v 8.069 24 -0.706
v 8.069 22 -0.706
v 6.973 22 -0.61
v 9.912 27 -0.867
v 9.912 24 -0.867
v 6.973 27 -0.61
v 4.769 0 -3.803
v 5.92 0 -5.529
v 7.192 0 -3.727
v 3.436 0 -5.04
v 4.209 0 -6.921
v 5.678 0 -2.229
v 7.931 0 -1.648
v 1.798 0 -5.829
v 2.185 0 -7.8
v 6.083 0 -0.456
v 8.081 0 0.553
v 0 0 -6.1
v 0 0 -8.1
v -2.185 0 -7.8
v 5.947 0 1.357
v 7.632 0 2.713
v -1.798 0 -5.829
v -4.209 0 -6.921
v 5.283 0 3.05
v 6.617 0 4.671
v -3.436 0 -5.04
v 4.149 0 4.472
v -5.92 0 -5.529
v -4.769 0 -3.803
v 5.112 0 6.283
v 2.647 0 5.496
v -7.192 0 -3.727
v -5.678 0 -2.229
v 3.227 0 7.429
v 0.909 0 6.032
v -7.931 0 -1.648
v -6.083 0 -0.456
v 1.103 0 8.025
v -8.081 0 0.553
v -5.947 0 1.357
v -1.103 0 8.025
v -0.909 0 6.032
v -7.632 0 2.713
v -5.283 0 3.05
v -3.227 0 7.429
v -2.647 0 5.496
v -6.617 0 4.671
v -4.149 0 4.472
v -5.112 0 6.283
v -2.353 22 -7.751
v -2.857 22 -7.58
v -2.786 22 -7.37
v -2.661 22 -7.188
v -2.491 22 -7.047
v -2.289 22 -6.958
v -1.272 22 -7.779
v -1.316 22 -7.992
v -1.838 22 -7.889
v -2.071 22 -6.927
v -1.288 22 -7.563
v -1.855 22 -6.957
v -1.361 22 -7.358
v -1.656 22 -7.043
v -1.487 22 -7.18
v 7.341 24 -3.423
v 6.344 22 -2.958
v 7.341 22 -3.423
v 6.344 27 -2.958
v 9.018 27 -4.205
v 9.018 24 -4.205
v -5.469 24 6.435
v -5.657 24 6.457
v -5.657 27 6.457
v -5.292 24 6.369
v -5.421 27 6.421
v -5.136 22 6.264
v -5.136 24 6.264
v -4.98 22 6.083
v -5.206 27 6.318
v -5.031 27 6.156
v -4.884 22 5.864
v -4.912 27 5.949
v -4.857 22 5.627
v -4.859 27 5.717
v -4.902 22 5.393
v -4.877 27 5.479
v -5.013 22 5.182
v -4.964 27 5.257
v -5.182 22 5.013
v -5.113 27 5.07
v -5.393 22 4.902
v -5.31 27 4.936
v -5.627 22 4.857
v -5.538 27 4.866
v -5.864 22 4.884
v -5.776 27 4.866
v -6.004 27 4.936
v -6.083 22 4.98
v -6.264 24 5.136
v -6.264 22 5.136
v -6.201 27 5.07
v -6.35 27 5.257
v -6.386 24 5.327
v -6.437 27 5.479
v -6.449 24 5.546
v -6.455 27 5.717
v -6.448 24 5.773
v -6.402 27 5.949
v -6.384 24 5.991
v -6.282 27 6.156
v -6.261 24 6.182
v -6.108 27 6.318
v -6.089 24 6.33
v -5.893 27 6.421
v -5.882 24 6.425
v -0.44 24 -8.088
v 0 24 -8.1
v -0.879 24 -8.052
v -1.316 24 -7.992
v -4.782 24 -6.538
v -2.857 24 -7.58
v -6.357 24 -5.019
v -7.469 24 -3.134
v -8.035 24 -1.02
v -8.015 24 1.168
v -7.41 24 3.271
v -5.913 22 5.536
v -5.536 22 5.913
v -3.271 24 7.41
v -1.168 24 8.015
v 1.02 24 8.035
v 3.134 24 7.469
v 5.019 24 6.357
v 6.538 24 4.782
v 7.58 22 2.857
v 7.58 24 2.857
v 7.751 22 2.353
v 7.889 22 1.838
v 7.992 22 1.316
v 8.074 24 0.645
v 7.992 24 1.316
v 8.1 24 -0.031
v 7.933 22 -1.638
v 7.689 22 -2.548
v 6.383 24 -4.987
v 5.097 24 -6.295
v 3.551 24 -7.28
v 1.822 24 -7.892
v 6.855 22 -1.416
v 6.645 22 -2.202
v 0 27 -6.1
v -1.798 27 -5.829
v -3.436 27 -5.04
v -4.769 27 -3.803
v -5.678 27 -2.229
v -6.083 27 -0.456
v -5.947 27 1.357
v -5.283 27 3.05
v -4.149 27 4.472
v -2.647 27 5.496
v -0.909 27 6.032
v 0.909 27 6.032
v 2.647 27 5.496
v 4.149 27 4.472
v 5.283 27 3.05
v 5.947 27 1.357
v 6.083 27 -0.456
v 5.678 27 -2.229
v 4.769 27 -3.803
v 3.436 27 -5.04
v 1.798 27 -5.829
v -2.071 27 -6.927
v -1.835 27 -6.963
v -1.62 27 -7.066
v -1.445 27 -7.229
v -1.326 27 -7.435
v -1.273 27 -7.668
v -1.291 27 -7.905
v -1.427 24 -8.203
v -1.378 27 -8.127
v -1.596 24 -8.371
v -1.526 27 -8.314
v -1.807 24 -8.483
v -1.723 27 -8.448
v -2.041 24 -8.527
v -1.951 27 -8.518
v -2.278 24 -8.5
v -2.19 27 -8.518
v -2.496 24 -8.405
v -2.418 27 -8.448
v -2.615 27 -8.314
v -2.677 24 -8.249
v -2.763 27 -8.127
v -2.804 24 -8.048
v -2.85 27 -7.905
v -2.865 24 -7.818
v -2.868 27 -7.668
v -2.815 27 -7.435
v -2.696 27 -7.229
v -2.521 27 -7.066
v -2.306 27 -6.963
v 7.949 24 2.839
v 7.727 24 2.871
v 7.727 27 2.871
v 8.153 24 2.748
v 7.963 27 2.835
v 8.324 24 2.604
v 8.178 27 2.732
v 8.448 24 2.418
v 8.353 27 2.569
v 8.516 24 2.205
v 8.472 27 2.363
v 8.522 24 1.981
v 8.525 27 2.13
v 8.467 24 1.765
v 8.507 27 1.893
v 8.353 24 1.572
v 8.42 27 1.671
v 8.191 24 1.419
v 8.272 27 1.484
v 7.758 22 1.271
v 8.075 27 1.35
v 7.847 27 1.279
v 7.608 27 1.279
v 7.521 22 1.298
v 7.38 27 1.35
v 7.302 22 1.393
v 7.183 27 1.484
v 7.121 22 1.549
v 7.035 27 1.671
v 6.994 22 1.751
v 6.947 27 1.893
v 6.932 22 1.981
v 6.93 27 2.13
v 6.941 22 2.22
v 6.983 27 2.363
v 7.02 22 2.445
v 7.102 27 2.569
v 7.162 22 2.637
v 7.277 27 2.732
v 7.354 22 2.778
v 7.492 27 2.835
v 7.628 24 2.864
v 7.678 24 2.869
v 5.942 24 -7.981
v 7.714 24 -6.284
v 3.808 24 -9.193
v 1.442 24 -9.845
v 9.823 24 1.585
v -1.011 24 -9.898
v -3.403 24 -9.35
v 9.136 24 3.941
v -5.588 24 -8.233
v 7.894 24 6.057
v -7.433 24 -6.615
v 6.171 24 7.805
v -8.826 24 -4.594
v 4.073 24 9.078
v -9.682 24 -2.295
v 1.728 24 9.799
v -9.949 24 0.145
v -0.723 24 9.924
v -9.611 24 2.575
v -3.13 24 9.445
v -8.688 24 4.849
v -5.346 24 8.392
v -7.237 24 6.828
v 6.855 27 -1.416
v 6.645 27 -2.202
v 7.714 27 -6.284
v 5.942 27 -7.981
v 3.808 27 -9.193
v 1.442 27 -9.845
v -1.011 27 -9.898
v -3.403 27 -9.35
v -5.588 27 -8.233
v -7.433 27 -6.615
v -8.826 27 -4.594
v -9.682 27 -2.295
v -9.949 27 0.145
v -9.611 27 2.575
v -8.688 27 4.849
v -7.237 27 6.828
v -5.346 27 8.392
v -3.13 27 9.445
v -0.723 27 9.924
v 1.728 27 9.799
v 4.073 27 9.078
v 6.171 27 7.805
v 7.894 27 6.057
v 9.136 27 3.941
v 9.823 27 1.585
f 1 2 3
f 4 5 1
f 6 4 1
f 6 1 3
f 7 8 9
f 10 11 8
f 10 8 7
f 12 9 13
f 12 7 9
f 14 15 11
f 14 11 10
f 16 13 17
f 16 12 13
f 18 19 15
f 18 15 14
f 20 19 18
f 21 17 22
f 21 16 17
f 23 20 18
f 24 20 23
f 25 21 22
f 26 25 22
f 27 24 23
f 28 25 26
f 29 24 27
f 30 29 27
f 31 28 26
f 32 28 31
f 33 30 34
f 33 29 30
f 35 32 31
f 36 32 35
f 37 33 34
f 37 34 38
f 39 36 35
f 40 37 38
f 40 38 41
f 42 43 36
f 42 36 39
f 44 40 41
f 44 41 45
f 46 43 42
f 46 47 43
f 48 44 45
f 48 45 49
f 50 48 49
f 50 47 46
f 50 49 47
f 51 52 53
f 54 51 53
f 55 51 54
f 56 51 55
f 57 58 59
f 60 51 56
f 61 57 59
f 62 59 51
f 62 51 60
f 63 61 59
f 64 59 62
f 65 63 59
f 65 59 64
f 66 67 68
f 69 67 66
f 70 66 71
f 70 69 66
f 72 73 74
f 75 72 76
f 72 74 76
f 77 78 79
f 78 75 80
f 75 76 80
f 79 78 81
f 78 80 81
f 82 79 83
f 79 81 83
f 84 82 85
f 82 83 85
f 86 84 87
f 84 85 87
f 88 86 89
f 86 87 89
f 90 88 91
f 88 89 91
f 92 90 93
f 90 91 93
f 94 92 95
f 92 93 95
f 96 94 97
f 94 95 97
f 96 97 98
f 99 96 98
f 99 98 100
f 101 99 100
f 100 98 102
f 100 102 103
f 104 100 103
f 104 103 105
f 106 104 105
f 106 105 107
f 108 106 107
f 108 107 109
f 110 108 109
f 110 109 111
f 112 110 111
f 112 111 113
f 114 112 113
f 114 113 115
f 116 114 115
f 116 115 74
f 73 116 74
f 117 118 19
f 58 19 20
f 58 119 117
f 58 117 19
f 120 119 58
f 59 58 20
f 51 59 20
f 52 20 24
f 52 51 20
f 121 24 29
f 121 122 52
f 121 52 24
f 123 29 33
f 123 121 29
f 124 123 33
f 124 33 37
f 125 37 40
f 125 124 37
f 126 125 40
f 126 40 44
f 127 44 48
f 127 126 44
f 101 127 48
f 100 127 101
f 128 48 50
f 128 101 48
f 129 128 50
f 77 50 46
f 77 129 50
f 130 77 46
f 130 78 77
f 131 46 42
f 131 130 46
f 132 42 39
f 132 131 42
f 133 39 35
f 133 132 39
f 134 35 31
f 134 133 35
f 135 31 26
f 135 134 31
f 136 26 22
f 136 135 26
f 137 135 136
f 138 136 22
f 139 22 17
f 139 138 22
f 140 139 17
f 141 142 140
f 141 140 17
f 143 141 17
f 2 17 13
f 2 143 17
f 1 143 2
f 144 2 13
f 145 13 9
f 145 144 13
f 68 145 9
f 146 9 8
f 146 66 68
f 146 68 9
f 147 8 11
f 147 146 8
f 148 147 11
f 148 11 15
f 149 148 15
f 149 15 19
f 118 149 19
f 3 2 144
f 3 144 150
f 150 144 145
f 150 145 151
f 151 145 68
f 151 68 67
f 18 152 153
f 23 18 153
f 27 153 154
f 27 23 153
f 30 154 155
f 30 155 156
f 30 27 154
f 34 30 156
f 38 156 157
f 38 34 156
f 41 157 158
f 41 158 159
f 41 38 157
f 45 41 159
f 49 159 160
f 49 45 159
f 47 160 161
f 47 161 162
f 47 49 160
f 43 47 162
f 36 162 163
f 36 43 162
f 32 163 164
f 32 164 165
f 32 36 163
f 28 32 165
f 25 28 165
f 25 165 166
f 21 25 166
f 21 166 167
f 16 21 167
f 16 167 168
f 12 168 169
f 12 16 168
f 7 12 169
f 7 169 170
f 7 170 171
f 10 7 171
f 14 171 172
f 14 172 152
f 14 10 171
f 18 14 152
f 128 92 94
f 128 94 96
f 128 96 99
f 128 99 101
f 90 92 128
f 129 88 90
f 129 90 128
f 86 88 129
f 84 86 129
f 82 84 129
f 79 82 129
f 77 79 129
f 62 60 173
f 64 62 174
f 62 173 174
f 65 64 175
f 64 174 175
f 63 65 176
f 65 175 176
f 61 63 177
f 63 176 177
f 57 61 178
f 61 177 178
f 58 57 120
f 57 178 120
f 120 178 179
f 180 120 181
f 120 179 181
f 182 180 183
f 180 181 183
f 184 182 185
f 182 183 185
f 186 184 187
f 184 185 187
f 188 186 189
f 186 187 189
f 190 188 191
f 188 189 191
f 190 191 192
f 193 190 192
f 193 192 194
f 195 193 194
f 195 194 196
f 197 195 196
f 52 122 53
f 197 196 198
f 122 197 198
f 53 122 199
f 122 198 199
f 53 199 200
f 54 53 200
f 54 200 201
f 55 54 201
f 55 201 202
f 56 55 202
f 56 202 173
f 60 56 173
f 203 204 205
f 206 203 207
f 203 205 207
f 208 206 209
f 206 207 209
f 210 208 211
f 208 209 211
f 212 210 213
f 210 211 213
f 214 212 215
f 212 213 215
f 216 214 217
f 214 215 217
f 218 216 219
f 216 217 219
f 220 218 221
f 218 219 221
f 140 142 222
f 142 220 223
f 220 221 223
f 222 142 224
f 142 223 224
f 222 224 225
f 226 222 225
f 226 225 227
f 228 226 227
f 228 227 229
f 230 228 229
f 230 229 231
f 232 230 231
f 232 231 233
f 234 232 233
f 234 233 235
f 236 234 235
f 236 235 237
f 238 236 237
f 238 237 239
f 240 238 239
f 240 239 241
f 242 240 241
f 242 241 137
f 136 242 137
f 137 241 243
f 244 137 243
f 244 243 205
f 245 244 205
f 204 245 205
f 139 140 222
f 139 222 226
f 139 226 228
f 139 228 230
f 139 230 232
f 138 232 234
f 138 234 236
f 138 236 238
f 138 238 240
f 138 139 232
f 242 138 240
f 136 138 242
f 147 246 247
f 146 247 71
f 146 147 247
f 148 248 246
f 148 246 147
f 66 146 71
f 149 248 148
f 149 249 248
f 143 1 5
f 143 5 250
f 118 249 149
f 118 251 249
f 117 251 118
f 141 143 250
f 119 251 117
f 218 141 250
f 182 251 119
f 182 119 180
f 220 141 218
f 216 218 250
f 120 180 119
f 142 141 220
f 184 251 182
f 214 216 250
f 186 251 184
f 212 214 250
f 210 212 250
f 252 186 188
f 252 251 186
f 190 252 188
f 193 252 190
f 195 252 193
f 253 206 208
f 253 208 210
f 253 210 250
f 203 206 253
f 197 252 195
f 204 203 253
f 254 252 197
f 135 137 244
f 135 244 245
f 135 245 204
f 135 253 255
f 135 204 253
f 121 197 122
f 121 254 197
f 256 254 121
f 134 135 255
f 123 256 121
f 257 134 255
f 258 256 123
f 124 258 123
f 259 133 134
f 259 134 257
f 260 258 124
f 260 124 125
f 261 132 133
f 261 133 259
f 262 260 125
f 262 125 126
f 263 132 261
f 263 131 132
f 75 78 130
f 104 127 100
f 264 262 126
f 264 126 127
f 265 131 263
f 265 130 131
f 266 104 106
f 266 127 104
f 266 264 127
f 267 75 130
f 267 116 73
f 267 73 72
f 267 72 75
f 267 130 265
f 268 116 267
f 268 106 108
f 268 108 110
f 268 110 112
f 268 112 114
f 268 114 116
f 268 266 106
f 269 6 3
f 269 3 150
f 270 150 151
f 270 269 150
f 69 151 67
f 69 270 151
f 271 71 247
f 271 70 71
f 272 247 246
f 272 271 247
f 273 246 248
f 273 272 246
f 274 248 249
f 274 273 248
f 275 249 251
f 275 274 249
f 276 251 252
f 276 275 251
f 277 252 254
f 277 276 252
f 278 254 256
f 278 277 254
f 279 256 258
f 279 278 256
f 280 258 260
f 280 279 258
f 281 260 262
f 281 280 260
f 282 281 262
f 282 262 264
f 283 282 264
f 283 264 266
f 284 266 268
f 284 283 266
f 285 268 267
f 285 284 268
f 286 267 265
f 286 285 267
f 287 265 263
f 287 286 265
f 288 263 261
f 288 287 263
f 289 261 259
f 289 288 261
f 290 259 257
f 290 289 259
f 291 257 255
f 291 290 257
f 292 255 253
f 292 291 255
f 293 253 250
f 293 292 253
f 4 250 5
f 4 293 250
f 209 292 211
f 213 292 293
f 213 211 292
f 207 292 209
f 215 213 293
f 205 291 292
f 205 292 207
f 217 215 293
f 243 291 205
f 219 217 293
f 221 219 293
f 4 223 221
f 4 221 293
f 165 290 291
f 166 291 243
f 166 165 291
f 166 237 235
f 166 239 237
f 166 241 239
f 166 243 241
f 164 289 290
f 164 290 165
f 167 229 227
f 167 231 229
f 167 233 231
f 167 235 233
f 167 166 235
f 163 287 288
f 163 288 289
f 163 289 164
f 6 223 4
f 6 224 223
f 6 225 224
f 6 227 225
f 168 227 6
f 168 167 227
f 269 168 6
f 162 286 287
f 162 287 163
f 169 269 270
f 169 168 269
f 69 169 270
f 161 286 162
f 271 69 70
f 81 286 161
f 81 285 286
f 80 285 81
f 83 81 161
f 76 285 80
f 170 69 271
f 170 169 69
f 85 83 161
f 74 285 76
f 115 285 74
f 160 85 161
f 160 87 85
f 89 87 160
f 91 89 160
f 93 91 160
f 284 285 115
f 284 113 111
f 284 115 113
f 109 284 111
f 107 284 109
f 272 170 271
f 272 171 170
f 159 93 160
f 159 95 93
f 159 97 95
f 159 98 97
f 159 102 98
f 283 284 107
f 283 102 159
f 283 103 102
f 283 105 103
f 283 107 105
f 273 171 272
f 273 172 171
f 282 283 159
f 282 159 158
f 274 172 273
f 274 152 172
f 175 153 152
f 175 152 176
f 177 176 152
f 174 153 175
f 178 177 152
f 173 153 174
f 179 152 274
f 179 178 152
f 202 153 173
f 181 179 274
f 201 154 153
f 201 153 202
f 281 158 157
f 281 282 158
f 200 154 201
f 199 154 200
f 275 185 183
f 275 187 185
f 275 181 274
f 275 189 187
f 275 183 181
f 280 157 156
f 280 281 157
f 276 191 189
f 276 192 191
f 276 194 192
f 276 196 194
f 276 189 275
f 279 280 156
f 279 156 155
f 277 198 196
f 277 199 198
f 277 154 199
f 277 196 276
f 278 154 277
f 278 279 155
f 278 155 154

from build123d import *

# Parameters (mm, degrees)
SKETCH3_R          = 0.8
CUT_EXTRUDE1_DEPTH = 5


with BuildPart() as part:
    # Sketch2 → Revolve1 (revolve)
    with BuildSketch(Plane.XY, mode=Mode.PRIVATE) as revolve1_sk:
        Polygon((6.1, 0), (8.1, 0), (8.1, 24), (9.95, 24), (9.95, 27), (6.1, 27), align=None)
    revolve(revolve1_sk.sketch.rotate(Axis((0, 0, 0), (0, 1, 0)), 90), axis=Axis((0, 0, 0), (0, 1, 0)))

    # Sketch3 → Cut-Extrude1 (cut)
    with BuildSketch(Plane(origin=(0, 27, 0), x_dir=(1, 0, 0), z_dir=(0, 1, 0))):
        with Locations(Location((7.72740661, -2.070552361, 0), (0, 0, 270))):
            Circle(SKETCH3_R)
        with Locations(Location((-5.656854249, -5.656854249, 0), (0, 0, 270))):
            Circle(SKETCH3_R)
        with Locations(Location((-2.070552361, 7.72740661, 0), (0, 0, 270))):
            Circle(SKETCH3_R)
        with BuildLine():
            Line((6.344154509, 2.958327832), (9.06307787, 4.226182617))
            ThreePointArc((9.06307787, 4.226182617), (9.659258263, 2.588190451), (9.961946981, 0.871557427))
            Line((9.961946981, 0.871557427), (6.973362887, 0.610090199))
            ThreePointArc((6.973362887, 0.610090199), (6.761480784, 1.811733316), (6.344154509, 2.958327832))
        make_face()
    extrude(amount=-CUT_EXTRUDE1_DEPTH, mode=Mode.SUBTRACT)


solid = part.part
